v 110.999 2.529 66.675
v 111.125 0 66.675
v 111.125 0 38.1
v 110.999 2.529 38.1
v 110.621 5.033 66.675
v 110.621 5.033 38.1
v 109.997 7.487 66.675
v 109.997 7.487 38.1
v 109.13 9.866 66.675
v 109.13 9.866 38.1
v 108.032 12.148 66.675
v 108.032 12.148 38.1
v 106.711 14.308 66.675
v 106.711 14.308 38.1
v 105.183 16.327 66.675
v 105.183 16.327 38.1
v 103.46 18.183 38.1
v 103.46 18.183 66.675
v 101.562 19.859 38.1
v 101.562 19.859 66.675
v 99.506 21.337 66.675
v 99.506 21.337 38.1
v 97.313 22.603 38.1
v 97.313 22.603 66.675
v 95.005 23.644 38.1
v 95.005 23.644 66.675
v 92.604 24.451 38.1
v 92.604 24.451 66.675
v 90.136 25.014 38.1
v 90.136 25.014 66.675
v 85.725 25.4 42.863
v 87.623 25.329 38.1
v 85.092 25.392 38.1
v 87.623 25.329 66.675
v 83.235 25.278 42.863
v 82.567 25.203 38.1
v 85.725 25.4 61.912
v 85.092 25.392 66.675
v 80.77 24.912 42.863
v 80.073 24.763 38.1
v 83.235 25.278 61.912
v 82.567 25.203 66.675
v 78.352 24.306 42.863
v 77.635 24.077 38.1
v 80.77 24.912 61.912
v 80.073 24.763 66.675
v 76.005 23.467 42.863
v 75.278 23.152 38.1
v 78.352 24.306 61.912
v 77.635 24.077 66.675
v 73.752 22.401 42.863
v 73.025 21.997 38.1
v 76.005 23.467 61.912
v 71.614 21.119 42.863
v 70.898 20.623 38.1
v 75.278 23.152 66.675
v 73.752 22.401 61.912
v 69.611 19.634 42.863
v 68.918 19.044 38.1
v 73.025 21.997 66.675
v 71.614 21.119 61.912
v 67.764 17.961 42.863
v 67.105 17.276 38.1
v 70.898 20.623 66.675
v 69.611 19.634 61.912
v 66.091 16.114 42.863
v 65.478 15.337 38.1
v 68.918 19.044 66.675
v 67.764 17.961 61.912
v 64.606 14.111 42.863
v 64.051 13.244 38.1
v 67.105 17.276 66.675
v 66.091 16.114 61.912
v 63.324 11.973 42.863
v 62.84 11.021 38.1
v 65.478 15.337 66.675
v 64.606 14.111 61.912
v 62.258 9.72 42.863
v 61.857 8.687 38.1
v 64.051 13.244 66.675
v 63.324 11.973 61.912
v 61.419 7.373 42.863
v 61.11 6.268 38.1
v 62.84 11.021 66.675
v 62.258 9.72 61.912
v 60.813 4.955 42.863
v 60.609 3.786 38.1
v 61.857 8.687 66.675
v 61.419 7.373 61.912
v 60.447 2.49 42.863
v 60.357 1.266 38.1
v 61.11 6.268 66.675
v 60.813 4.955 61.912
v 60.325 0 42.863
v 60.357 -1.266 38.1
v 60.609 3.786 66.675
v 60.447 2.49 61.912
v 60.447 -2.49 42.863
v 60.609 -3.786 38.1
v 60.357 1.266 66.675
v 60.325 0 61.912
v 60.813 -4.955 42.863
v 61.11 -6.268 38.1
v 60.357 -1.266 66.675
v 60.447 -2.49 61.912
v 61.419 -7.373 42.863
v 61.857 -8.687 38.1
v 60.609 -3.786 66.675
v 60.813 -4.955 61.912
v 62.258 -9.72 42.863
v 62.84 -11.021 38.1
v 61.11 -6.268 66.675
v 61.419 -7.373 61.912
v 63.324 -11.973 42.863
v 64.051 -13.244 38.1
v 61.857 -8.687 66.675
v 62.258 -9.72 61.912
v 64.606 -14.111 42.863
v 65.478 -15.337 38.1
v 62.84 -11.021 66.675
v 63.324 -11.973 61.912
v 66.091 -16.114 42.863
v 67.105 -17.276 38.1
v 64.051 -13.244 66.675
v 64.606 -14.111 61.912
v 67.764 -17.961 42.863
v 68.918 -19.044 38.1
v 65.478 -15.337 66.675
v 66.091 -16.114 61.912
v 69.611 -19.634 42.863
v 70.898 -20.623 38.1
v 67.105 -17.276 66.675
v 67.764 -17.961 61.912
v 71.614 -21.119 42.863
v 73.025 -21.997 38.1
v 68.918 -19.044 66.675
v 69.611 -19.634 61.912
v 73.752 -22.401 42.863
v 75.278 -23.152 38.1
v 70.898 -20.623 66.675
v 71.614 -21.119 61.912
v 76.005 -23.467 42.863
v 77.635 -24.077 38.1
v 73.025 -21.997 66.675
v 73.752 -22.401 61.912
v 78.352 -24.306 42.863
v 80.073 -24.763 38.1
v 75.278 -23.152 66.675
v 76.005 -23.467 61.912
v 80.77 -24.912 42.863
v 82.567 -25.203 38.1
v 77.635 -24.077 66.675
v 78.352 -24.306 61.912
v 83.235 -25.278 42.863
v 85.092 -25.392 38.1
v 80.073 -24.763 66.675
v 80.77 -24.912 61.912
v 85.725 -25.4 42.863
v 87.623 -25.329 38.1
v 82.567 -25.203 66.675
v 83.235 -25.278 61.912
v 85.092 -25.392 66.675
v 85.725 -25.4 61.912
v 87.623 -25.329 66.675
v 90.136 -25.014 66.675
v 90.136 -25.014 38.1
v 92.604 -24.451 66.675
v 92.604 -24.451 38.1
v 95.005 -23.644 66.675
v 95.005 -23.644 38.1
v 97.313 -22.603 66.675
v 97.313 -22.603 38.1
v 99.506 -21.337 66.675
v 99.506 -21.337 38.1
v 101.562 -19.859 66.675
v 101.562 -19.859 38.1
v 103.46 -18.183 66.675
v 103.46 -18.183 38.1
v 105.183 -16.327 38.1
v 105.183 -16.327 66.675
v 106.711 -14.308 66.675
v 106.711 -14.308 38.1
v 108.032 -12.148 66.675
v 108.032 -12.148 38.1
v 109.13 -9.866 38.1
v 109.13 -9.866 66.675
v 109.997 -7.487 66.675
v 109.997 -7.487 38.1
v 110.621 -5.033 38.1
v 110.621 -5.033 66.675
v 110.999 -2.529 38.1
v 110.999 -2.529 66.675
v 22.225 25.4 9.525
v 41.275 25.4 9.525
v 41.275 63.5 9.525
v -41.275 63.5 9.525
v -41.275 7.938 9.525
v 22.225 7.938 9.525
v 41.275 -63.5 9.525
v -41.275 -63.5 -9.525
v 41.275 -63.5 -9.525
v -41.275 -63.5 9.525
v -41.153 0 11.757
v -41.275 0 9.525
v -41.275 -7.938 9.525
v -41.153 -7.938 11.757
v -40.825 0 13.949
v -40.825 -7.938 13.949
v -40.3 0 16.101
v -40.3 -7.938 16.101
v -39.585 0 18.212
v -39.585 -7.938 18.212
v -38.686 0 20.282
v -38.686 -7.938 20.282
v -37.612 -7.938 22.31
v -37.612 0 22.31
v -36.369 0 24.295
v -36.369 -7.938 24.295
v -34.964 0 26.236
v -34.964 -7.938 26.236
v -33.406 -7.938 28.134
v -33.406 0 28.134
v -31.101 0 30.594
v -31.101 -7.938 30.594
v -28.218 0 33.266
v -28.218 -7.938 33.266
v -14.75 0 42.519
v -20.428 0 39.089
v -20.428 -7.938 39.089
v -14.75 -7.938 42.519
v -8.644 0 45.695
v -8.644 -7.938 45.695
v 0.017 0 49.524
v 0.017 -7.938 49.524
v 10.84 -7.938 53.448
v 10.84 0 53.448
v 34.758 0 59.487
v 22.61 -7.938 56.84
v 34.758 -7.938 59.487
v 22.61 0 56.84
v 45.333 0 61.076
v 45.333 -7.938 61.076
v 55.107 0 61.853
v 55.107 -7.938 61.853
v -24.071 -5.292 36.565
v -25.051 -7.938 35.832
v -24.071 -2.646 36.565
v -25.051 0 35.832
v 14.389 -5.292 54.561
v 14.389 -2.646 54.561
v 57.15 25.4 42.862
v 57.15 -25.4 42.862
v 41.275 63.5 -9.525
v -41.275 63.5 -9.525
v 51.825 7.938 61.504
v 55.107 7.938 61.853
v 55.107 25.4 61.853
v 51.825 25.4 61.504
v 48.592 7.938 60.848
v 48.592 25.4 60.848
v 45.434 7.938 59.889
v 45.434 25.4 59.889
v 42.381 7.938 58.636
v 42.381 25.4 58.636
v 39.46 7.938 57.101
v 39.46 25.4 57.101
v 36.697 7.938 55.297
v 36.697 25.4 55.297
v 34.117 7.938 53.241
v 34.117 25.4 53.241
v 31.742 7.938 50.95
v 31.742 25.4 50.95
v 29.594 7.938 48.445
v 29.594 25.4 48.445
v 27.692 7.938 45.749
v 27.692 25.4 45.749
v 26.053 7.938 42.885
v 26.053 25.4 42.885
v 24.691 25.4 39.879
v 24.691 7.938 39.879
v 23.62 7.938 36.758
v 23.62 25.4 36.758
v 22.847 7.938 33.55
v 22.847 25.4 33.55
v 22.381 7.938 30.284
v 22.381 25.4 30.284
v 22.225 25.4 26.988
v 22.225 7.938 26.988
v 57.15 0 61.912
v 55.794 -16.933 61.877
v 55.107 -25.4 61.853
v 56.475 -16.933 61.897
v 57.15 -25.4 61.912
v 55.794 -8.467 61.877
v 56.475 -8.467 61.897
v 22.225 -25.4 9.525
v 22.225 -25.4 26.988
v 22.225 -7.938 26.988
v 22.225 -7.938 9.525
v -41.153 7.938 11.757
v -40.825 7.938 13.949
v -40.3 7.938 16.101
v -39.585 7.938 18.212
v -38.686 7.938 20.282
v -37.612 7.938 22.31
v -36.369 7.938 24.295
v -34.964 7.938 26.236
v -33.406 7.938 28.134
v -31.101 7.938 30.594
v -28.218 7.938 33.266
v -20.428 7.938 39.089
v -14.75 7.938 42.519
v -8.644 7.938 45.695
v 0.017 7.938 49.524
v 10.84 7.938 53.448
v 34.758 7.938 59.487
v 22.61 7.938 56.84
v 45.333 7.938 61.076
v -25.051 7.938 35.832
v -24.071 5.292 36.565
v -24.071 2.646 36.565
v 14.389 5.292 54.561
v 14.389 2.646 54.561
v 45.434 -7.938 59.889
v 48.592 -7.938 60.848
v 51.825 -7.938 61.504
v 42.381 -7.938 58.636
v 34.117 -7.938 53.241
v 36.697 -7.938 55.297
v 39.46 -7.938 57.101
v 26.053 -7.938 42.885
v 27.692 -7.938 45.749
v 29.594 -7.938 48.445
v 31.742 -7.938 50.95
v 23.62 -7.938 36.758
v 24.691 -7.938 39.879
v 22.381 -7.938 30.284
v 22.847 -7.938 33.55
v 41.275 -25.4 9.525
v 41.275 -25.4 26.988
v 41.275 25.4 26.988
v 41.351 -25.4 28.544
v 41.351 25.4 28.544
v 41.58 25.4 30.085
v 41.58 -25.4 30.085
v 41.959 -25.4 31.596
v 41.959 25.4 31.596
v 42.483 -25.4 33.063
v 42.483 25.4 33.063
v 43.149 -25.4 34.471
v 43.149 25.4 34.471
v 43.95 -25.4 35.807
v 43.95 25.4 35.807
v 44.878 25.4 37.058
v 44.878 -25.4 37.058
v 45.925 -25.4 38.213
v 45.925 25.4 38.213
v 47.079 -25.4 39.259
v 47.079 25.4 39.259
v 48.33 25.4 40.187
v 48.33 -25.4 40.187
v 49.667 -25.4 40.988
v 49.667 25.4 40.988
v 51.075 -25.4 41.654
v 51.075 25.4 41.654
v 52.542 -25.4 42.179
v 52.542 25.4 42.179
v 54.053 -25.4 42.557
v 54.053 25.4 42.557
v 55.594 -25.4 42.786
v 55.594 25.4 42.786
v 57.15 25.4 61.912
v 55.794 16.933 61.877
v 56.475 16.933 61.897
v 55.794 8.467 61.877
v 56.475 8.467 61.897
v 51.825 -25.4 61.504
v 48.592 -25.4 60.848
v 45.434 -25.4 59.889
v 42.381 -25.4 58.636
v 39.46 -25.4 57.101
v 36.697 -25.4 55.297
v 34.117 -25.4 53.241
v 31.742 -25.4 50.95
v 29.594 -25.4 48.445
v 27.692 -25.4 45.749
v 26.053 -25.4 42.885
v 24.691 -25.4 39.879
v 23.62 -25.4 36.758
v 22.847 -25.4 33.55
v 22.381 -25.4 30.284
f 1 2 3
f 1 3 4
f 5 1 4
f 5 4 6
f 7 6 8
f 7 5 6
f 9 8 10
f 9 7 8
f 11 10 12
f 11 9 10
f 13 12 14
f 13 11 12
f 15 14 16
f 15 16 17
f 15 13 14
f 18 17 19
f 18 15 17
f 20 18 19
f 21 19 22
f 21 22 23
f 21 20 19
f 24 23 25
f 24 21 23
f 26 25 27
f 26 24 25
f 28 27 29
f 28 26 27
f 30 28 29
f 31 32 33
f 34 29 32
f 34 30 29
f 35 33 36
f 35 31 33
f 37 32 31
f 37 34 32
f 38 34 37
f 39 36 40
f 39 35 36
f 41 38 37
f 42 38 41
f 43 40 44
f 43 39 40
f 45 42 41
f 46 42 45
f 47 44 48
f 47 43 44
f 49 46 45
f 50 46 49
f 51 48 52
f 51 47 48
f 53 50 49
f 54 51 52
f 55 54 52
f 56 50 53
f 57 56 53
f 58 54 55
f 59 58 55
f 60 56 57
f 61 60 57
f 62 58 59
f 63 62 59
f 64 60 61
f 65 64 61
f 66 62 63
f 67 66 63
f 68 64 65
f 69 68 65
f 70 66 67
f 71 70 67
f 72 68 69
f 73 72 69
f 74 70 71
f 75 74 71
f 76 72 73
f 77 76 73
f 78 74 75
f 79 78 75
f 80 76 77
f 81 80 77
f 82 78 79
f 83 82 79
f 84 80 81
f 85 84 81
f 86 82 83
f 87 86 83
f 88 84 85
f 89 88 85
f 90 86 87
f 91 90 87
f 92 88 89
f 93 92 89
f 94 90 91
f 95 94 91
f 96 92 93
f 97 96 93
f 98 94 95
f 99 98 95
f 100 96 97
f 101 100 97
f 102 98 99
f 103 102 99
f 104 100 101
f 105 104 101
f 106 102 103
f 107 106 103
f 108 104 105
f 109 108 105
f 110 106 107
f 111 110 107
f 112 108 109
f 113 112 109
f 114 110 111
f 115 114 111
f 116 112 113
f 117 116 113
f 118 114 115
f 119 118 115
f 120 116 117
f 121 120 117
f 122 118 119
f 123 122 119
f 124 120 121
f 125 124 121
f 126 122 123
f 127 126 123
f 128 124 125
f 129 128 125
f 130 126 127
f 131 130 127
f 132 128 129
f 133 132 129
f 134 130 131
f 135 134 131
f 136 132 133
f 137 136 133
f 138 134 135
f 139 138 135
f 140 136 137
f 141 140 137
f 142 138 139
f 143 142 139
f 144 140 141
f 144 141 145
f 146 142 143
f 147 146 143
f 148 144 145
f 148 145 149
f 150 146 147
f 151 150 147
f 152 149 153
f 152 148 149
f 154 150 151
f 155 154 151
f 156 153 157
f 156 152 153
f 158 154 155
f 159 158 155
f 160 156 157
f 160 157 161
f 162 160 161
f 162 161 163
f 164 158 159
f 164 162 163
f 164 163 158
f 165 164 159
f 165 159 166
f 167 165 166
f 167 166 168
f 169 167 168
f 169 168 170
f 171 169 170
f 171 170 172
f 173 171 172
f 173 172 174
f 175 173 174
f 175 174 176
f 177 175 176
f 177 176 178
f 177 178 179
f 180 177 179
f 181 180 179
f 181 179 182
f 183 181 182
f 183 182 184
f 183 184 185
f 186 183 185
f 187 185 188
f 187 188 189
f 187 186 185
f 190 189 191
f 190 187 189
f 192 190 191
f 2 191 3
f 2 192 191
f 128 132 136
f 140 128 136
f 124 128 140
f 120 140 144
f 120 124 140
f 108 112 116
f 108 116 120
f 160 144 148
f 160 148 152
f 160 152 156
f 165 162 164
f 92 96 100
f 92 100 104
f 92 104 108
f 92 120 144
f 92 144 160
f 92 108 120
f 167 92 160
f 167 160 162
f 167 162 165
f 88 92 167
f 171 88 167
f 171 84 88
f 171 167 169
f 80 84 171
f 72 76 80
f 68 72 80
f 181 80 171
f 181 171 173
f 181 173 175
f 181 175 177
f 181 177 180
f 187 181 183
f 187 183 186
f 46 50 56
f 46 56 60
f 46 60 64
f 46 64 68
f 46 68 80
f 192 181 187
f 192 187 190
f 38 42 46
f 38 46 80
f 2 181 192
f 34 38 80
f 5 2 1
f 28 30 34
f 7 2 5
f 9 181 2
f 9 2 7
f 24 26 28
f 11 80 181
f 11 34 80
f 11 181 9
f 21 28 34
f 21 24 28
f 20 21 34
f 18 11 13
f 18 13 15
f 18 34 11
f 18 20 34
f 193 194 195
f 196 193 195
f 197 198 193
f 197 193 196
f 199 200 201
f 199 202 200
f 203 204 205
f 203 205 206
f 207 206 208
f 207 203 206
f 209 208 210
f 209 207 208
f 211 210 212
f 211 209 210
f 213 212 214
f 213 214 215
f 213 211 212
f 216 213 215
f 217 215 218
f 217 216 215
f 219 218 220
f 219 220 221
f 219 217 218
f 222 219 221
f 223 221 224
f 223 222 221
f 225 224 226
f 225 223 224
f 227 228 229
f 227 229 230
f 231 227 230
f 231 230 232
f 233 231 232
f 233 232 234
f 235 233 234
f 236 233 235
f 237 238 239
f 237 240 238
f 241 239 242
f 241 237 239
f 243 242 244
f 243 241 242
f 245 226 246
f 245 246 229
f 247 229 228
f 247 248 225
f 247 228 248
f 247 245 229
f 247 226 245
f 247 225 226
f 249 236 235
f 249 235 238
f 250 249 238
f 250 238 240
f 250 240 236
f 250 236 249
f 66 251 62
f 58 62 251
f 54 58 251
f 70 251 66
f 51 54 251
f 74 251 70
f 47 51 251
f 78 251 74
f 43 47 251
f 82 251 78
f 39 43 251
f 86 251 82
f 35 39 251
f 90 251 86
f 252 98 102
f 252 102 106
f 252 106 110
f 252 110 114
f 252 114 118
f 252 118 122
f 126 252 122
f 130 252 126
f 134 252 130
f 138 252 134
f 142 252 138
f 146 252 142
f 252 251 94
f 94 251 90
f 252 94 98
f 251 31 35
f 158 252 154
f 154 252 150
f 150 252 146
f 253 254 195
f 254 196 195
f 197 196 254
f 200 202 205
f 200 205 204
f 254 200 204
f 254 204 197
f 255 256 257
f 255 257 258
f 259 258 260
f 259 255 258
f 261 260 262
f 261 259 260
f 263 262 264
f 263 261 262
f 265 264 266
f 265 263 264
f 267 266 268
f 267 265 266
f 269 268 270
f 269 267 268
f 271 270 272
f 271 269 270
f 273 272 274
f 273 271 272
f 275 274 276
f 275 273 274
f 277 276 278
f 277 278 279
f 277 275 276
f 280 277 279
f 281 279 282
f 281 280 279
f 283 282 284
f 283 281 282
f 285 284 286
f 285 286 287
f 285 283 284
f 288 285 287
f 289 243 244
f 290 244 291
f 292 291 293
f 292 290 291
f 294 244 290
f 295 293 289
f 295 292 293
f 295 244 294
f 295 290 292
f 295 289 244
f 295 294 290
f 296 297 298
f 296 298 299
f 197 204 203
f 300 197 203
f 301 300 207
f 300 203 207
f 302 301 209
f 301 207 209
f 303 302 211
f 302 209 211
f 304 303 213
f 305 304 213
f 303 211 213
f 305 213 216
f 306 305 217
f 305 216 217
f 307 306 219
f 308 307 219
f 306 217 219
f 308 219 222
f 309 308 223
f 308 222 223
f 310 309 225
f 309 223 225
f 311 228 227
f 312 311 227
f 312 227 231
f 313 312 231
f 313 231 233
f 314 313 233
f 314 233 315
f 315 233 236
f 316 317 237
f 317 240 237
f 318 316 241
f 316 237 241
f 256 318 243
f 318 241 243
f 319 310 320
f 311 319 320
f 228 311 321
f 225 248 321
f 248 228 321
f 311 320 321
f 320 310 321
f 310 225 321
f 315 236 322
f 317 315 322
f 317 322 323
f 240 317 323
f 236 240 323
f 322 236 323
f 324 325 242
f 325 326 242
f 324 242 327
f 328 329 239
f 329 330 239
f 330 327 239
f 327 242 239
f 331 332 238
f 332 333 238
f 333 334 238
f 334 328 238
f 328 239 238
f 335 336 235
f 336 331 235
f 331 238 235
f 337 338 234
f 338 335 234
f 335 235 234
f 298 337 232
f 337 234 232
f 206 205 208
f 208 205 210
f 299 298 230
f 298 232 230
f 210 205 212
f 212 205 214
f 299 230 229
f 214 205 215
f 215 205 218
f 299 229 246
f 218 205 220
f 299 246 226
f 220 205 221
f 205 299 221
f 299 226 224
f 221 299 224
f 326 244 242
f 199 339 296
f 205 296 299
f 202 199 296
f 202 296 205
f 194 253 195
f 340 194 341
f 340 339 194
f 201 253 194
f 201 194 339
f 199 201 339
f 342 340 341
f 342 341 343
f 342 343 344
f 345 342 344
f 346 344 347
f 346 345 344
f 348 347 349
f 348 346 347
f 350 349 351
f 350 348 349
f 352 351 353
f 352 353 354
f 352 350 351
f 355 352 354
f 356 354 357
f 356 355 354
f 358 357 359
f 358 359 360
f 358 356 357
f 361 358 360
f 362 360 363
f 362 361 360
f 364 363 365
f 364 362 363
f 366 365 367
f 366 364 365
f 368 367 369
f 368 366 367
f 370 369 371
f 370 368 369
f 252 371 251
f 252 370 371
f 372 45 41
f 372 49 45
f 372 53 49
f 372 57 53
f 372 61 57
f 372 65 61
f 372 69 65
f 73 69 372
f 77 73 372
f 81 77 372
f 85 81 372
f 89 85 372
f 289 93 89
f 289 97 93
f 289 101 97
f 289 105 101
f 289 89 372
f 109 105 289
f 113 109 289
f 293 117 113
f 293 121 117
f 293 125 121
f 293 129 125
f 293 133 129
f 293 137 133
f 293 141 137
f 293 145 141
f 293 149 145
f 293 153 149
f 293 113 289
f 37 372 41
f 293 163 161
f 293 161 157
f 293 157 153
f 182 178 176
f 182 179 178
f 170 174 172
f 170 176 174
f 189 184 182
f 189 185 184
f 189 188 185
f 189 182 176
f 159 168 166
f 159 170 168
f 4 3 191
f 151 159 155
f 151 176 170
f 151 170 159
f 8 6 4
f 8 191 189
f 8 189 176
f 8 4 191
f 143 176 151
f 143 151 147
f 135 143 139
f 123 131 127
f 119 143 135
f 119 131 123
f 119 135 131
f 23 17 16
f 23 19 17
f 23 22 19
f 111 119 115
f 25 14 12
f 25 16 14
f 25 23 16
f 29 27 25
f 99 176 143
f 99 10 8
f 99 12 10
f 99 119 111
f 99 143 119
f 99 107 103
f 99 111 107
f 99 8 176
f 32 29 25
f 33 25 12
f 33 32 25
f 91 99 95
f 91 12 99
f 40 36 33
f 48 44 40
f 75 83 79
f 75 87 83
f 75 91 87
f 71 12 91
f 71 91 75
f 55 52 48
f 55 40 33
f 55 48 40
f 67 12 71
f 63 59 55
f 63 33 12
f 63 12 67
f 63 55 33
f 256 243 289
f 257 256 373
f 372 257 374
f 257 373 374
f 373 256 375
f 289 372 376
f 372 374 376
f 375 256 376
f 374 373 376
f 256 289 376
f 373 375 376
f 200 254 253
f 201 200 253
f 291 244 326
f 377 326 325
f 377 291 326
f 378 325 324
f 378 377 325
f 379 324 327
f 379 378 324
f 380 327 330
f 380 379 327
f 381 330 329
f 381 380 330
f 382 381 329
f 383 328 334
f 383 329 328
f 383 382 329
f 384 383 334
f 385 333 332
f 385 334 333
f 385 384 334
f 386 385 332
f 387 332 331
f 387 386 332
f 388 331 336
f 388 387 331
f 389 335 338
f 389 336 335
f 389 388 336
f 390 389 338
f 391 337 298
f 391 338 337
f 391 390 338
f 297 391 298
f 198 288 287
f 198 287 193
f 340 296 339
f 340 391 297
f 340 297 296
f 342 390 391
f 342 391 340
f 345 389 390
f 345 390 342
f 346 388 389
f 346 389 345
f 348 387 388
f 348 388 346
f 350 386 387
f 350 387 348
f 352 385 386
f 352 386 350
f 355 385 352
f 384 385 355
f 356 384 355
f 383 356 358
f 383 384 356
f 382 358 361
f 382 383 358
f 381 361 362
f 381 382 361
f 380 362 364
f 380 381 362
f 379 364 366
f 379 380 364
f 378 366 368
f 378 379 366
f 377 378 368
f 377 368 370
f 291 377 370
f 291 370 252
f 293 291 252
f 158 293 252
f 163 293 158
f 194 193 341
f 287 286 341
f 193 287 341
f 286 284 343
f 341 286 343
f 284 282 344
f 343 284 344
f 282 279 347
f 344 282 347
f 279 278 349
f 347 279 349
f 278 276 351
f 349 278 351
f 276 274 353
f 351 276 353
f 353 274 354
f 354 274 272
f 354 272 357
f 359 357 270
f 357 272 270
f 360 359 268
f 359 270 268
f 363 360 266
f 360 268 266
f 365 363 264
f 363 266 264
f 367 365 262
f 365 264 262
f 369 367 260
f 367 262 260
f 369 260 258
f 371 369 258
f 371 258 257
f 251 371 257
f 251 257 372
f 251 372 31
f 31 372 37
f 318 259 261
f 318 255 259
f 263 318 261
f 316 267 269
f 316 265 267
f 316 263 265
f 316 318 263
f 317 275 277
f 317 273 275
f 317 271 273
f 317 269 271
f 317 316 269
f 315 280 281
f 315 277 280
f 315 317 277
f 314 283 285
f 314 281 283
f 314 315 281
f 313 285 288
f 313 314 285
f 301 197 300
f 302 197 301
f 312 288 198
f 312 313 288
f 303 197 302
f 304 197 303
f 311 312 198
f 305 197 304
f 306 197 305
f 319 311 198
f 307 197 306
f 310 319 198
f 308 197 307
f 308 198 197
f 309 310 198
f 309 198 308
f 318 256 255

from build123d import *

# Parameters (mm, degrees)
F1_DEPTH = 63.5
F0_W     = 25.4
F0_H     = 19.05
F2_DEPTH = 25.4
F3_DEPTH = 7.9375


with BuildPart() as f1:
    # F0 (on Front) → F1 (new body, symmetric)
    with BuildSketch(Plane.XZ):
        Polygon((-41.275, -9.525), (41.275, -9.525), (41.275, 9.525), (22.225, 9.525), (-41.275, 9.525), align=None)
    extrude(amount=F1_DEPTH, both=True)

    # F0 (on Front) → F2 (join, symmetric)
    with BuildSketch(Plane.XZ):
        with BuildLine():
            Line((22.225, 9.525), (41.275, 9.525))
            Line((41.275, 9.525), (41.275, 26.9875))
            ThreePointArc((41.275, 26.9875), (45.9246798487, 38.2128201513), (57.15, 42.8625))
            Line((57.15, 42.8625), (60.325, 42.8625))
            Line((60.325, 42.8625), (60.325, 61.9125))
            Line((60.325, 61.9125), (57.15, 61.9125))
            add(Edge.make_bspline(
                [(55.1065557691, 61.8526683013), (55.7974191484, 61.8796491304), (56.4787770702, 61.8996113569), (57.15, 61.9125)],
                knots=[109.3708422168, 109.3708422168, 109.3708422168, 109.3708422168, 111.4985685166, 111.4985685166, 111.4985685166, 111.4985685166], degree=3))
            ThreePointArc((55.1065557691, 61.8526683013), (31.7420985246, 50.9498489587), (22.225, 26.9875))
            Line((22.225, 26.9875), (22.225, 9.525))
        make_face()
        with Locations((73.025, 52.3875)):
            Rectangle(F0_W, F0_H)
    extrude(amount=F2_DEPTH, both=True)

    # F0 (on Front) → F3 (join, symmetric)
    with BuildSketch(Plane.XZ):
        with BuildLine():
            add(Edge.make_bspline(
                [(-41.275, 9.525), (-41.0335689885, 40.5340906576), (19.5943239296, 60.4657812745), (55.1065557691, 61.8526683013)],
                knots=[0, 0, 0, 0, 109.3708422168, 109.3708422168, 109.3708422168, 109.3708422168], degree=3))
            Line((-41.275, 9.525), (22.225, 9.525))
            Line((22.225, 9.525), (22.225, 26.9875))
            ThreePointArc((22.225, 26.9875), (31.7420985246, 50.9498489587), (55.1065557691, 61.8526683013))
        make_face()
    extrude(amount=F3_DEPTH, both=True)

    # F0 (on Front) → F4 (revolve)
    with BuildSketch(Plane.XZ):
        Polygon((85.725, 61.9125), (85.725, 42.8625), (85.725, 38.1), (111.125, 38.1), (111.125, 66.675), (85.725, 66.675), align=None)
    revolve(axis=Axis((85.725, 0, 52.3875), (0, 0, 1)))


solid = f1.part
